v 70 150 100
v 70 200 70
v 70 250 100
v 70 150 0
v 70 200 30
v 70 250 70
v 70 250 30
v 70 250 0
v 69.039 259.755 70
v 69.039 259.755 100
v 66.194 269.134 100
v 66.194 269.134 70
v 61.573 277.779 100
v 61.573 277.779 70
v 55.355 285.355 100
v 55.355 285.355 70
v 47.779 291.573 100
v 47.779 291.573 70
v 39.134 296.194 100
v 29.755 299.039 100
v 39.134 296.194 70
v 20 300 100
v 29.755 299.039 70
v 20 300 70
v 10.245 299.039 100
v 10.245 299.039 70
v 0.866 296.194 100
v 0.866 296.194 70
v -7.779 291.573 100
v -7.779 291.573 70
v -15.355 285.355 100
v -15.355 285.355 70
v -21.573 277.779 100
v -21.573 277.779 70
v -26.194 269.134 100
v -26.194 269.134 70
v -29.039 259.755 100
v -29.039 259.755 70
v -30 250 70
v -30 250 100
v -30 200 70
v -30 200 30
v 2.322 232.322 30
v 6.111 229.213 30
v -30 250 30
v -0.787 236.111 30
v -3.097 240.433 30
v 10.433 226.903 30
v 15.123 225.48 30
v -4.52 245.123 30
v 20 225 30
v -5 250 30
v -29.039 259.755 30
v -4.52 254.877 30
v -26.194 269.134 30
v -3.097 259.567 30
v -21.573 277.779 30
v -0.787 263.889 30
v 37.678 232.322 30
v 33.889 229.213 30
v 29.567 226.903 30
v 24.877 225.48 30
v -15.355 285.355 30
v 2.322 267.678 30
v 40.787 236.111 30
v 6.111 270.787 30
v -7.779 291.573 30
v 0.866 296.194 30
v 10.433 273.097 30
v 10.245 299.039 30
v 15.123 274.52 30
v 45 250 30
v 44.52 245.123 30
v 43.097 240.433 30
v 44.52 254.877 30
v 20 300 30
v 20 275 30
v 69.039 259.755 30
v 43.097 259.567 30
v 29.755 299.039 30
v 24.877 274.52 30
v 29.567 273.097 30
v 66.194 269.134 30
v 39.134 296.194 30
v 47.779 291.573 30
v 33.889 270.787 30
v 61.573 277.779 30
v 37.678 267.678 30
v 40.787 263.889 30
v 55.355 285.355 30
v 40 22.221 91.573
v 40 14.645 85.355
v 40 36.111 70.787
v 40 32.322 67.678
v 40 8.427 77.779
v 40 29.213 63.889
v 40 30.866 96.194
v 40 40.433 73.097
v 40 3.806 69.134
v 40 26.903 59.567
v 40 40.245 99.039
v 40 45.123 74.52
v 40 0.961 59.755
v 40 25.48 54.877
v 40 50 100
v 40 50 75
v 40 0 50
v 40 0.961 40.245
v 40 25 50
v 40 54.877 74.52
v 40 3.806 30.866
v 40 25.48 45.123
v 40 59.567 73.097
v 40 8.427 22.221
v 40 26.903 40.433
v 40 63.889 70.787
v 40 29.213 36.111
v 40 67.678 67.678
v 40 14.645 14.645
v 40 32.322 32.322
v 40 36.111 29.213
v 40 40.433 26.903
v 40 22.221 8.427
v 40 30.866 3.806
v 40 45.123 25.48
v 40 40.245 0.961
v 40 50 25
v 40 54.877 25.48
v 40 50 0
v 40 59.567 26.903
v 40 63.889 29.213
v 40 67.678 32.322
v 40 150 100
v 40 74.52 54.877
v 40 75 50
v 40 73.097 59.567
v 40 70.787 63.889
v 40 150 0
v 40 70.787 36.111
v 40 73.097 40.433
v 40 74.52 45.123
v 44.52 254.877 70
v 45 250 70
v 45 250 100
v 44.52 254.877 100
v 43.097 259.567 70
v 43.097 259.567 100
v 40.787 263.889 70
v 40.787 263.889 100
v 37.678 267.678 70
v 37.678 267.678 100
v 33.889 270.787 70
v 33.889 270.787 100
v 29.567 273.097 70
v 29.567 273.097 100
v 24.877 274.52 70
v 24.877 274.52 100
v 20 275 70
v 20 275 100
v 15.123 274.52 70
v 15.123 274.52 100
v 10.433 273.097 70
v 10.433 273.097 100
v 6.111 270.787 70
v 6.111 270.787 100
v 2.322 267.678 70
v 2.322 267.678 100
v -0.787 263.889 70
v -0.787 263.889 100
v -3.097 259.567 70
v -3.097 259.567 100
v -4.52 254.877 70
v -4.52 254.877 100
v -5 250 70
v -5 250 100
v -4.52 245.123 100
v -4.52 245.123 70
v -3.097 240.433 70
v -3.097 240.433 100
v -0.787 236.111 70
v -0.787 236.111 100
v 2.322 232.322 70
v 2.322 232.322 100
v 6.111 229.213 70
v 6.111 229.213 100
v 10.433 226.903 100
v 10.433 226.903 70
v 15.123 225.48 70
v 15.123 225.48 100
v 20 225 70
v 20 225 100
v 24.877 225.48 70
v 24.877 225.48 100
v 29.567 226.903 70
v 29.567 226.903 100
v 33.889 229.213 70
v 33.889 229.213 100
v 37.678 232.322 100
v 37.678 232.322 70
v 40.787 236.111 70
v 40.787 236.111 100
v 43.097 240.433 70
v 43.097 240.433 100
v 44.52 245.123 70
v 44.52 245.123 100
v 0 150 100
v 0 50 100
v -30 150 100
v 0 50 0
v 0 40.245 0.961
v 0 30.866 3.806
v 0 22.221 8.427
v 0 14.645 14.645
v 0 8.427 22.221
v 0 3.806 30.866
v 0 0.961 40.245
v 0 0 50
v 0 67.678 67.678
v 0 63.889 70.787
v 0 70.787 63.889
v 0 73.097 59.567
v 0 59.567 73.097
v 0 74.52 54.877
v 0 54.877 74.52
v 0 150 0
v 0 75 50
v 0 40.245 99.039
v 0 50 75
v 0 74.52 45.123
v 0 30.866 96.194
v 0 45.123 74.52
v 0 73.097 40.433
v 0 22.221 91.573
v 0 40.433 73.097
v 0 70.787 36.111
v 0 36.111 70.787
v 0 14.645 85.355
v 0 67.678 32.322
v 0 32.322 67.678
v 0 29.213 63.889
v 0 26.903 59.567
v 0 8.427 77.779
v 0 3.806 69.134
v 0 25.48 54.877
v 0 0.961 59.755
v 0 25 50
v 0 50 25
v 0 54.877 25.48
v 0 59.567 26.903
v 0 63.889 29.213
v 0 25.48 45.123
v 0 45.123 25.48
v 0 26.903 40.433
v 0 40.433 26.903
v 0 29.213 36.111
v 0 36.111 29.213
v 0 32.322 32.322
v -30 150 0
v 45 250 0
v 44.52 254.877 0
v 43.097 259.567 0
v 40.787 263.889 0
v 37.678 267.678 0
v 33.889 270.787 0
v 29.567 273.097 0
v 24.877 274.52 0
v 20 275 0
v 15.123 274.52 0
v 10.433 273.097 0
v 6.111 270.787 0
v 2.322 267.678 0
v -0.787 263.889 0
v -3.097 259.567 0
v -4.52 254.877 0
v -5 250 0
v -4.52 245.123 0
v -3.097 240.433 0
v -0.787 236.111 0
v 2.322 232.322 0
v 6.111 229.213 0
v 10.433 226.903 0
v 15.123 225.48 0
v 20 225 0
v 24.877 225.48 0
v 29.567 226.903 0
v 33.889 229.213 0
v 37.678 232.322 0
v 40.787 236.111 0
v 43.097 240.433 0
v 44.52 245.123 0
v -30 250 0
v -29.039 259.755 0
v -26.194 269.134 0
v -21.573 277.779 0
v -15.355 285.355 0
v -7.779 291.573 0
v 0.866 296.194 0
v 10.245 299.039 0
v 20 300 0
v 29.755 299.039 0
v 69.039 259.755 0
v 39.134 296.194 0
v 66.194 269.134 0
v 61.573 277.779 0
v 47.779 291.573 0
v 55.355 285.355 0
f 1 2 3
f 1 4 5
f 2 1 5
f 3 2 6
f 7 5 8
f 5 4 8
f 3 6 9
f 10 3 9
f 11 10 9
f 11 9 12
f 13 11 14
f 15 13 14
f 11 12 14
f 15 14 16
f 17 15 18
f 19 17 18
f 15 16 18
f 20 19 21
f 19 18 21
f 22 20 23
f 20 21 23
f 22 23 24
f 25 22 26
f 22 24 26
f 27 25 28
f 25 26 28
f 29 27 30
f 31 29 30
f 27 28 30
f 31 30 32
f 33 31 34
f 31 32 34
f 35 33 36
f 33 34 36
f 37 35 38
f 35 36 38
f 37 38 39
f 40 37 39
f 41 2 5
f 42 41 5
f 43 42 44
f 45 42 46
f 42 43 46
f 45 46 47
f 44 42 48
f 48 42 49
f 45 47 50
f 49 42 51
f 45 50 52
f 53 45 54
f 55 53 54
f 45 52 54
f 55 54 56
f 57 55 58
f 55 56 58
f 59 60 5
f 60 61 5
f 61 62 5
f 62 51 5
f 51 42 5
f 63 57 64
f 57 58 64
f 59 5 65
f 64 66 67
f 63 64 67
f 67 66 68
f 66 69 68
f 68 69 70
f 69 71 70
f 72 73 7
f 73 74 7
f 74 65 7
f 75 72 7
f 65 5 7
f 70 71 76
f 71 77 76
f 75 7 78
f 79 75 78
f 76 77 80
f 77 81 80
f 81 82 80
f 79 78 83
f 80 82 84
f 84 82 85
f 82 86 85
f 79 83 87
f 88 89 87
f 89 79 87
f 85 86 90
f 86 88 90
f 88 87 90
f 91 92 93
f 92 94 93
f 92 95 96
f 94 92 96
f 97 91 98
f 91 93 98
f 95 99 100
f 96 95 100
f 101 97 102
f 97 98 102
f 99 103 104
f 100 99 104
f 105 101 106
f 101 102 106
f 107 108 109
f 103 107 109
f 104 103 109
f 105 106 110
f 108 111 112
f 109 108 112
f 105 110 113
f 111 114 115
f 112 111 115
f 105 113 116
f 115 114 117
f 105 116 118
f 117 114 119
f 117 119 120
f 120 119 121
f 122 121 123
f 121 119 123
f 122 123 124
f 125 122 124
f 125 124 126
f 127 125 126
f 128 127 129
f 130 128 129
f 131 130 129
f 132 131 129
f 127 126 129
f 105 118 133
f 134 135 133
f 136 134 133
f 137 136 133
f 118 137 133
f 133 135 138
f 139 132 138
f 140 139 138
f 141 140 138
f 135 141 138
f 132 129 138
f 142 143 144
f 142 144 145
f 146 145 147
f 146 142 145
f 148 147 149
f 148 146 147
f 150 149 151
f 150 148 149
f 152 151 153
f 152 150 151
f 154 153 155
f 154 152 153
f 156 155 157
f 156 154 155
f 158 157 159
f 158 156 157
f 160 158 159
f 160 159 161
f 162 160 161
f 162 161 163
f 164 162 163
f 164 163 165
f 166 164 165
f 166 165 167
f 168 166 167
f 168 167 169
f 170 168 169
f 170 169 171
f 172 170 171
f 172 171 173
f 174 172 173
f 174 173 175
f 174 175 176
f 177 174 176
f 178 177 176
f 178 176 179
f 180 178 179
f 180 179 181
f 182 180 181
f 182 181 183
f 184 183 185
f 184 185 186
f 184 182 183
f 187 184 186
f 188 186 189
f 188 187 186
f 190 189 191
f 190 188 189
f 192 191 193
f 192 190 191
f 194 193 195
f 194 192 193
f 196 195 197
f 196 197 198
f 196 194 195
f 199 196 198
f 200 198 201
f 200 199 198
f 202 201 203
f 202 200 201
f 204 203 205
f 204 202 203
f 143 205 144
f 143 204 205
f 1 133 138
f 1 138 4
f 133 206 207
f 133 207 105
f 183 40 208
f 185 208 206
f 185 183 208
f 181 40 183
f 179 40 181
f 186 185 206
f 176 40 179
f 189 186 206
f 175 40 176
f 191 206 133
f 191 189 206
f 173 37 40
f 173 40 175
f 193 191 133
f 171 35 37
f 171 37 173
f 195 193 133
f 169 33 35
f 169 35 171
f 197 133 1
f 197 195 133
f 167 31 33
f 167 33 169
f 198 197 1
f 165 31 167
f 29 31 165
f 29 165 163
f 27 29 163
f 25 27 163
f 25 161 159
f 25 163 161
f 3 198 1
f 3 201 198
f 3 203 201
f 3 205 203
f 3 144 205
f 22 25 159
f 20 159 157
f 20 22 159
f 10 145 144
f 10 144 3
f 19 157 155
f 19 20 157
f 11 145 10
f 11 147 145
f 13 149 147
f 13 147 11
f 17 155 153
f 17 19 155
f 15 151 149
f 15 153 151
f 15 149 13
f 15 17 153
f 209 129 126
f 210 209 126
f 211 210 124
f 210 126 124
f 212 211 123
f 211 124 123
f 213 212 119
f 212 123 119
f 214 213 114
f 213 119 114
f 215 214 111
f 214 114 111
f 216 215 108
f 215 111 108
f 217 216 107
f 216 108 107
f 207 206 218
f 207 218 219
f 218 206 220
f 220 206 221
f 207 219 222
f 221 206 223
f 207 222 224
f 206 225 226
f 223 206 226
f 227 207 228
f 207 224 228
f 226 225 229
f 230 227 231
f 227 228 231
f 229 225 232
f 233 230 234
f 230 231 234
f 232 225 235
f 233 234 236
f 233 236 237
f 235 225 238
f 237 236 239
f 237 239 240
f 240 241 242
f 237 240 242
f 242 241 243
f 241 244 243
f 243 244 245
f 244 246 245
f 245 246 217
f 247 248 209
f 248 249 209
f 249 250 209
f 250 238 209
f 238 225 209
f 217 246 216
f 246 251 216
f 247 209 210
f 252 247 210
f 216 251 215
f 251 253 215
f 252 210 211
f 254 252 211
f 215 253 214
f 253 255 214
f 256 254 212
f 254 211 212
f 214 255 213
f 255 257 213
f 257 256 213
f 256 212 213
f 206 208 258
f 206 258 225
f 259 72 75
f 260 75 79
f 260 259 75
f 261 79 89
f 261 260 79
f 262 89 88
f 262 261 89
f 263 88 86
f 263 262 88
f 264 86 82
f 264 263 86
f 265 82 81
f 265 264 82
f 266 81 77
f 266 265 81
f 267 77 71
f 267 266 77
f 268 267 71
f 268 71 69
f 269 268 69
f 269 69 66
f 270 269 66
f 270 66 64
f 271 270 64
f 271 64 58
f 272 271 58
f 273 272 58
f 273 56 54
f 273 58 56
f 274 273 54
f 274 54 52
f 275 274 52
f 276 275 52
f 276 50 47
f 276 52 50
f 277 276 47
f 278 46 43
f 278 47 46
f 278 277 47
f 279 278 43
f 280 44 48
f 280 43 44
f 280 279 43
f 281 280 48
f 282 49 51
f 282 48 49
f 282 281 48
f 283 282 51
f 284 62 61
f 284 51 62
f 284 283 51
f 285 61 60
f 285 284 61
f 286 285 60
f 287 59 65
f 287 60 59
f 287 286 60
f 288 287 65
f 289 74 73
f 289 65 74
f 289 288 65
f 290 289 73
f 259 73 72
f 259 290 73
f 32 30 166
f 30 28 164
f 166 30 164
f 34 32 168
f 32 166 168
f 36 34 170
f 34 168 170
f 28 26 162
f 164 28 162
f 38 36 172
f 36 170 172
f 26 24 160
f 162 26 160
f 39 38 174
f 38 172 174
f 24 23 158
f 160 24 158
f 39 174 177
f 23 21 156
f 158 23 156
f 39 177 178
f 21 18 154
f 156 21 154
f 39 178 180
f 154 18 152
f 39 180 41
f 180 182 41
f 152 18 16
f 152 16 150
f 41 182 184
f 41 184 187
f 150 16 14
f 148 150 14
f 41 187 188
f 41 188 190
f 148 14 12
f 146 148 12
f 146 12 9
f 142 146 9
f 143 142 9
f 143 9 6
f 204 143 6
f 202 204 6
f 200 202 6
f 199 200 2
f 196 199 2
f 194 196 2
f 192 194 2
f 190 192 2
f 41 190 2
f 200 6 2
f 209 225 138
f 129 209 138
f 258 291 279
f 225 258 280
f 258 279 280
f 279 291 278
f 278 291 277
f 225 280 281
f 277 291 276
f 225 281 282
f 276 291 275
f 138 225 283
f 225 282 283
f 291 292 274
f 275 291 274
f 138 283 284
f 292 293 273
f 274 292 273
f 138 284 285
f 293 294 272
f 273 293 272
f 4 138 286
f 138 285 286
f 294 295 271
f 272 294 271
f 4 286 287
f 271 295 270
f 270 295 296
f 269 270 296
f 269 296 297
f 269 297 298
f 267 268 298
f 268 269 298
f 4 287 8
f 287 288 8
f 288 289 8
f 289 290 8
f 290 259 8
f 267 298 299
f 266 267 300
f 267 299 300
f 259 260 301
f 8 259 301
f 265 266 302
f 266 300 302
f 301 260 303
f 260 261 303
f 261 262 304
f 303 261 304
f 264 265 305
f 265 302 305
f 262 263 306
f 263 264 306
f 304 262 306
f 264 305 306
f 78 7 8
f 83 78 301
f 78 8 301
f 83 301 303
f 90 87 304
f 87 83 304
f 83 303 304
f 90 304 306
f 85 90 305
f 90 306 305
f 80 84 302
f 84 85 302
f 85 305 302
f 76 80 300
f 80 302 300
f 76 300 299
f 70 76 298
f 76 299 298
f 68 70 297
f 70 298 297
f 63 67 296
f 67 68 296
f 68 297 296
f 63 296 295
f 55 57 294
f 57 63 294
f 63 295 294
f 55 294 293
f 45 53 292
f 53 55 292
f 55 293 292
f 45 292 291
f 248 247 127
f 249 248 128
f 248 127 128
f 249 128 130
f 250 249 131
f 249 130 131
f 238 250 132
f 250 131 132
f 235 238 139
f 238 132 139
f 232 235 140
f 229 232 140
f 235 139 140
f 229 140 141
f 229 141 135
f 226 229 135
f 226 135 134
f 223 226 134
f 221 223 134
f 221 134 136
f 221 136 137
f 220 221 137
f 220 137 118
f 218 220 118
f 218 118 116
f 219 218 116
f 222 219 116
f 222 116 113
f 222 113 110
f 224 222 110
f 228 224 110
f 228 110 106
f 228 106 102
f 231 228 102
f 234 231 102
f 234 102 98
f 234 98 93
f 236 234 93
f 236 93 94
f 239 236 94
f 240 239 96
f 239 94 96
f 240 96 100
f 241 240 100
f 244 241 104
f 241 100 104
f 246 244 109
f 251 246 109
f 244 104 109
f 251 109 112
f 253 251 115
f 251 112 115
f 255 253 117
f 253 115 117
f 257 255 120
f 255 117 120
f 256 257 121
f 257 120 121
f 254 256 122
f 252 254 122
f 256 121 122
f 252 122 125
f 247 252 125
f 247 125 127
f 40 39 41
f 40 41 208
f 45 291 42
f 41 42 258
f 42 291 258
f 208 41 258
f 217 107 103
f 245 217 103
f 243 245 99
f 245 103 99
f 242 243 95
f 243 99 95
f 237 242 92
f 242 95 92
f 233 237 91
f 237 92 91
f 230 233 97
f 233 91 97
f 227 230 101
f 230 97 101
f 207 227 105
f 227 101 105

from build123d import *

# Parameters (mm, degrees)
CROQUIS2_R              = 25
SALIENTE_EXTRUIR1_DEPTH = 100
CORTAR_EXTRUIR1_DEPTH   = 100
CROQUIS4_R              = 25
CORTAR_EXTRUIR2_DEPTH   = 100
CROQUIS5_W              = 40
CROQUIS5_H              = 50
CORTAR_EXTRUIR3_DEPTH   = 101


with BuildPart() as part:
    # Croquis2 → Saliente-Extruir1 (new body)
    with BuildSketch(Plane.XY):
        with BuildLine():
            Line((0, 0), (40, 0))
            Line((40, 0), (40, 150))
            Line((40, 150), (70, 150))
            Line((70, 150), (70, 250))
            ThreePointArc((70, 250), (20, 300), (-30, 250))
            Line((-30, 250), (-30, 150))
            Line((-30, 150), (0, 150))
            Line((0, 150), (0, 0))
        make_face()
        with Locations((20, 250)):
            Circle(CROQUIS2_R, mode=Mode.SUBTRACT)
    extrude(amount=SALIENTE_EXTRUIR1_DEPTH)

    # Croquis3 → Cortar-Extruir1 (cut)
    with BuildSketch(Plane(origin=(40, 0, 0), x_dir=(0, 0, -1), z_dir=(1, 0, 0))):
        with BuildLine():
            ThreePointArc((-50, 0), (-85.355339059, 14.644660941), (-100, 50))
            Line((-100, 50), (-100, 0))
            Line((-100, 0), (-50, 0))
        make_face()
        with BuildLine():
            ThreePointArc((0, 50), (-14.644660941, 14.644660941), (-50, 0))
            Line((-50, 0), (0, 0))
            Line((0, 0), (0, 50))
        make_face()
    extrude(amount=-CORTAR_EXTRUIR1_DEPTH, mode=Mode.SUBTRACT)

    # Croquis4 → Cortar-Extruir2 (cut)
    with BuildSketch(Plane(origin=(40, 0, 0), x_dir=(0, 0, -1), z_dir=(1, 0, 0))):
        with Locations((-50, 50)):
            Circle(CROQUIS4_R)
    extrude(amount=-CORTAR_EXTRUIR2_DEPTH, mode=Mode.SUBTRACT)

    # Croquis5 → Cortar-Extruir3 (cut, through all)
    with BuildSketch(Plane(origin=(70, 0, 0), x_dir=(0, 0, -1), z_dir=(1, 0, 0))):
        with Locations((-50, 275)):
            Rectangle(CROQUIS5_W, CROQUIS5_H)
        with Locations((-50, 225)):
            Rectangle(CROQUIS5_W, CROQUIS5_H)
    extrude(amount=-CORTAR_EXTRUIR3_DEPTH, mode=Mode.SUBTRACT)


solid = part.part
